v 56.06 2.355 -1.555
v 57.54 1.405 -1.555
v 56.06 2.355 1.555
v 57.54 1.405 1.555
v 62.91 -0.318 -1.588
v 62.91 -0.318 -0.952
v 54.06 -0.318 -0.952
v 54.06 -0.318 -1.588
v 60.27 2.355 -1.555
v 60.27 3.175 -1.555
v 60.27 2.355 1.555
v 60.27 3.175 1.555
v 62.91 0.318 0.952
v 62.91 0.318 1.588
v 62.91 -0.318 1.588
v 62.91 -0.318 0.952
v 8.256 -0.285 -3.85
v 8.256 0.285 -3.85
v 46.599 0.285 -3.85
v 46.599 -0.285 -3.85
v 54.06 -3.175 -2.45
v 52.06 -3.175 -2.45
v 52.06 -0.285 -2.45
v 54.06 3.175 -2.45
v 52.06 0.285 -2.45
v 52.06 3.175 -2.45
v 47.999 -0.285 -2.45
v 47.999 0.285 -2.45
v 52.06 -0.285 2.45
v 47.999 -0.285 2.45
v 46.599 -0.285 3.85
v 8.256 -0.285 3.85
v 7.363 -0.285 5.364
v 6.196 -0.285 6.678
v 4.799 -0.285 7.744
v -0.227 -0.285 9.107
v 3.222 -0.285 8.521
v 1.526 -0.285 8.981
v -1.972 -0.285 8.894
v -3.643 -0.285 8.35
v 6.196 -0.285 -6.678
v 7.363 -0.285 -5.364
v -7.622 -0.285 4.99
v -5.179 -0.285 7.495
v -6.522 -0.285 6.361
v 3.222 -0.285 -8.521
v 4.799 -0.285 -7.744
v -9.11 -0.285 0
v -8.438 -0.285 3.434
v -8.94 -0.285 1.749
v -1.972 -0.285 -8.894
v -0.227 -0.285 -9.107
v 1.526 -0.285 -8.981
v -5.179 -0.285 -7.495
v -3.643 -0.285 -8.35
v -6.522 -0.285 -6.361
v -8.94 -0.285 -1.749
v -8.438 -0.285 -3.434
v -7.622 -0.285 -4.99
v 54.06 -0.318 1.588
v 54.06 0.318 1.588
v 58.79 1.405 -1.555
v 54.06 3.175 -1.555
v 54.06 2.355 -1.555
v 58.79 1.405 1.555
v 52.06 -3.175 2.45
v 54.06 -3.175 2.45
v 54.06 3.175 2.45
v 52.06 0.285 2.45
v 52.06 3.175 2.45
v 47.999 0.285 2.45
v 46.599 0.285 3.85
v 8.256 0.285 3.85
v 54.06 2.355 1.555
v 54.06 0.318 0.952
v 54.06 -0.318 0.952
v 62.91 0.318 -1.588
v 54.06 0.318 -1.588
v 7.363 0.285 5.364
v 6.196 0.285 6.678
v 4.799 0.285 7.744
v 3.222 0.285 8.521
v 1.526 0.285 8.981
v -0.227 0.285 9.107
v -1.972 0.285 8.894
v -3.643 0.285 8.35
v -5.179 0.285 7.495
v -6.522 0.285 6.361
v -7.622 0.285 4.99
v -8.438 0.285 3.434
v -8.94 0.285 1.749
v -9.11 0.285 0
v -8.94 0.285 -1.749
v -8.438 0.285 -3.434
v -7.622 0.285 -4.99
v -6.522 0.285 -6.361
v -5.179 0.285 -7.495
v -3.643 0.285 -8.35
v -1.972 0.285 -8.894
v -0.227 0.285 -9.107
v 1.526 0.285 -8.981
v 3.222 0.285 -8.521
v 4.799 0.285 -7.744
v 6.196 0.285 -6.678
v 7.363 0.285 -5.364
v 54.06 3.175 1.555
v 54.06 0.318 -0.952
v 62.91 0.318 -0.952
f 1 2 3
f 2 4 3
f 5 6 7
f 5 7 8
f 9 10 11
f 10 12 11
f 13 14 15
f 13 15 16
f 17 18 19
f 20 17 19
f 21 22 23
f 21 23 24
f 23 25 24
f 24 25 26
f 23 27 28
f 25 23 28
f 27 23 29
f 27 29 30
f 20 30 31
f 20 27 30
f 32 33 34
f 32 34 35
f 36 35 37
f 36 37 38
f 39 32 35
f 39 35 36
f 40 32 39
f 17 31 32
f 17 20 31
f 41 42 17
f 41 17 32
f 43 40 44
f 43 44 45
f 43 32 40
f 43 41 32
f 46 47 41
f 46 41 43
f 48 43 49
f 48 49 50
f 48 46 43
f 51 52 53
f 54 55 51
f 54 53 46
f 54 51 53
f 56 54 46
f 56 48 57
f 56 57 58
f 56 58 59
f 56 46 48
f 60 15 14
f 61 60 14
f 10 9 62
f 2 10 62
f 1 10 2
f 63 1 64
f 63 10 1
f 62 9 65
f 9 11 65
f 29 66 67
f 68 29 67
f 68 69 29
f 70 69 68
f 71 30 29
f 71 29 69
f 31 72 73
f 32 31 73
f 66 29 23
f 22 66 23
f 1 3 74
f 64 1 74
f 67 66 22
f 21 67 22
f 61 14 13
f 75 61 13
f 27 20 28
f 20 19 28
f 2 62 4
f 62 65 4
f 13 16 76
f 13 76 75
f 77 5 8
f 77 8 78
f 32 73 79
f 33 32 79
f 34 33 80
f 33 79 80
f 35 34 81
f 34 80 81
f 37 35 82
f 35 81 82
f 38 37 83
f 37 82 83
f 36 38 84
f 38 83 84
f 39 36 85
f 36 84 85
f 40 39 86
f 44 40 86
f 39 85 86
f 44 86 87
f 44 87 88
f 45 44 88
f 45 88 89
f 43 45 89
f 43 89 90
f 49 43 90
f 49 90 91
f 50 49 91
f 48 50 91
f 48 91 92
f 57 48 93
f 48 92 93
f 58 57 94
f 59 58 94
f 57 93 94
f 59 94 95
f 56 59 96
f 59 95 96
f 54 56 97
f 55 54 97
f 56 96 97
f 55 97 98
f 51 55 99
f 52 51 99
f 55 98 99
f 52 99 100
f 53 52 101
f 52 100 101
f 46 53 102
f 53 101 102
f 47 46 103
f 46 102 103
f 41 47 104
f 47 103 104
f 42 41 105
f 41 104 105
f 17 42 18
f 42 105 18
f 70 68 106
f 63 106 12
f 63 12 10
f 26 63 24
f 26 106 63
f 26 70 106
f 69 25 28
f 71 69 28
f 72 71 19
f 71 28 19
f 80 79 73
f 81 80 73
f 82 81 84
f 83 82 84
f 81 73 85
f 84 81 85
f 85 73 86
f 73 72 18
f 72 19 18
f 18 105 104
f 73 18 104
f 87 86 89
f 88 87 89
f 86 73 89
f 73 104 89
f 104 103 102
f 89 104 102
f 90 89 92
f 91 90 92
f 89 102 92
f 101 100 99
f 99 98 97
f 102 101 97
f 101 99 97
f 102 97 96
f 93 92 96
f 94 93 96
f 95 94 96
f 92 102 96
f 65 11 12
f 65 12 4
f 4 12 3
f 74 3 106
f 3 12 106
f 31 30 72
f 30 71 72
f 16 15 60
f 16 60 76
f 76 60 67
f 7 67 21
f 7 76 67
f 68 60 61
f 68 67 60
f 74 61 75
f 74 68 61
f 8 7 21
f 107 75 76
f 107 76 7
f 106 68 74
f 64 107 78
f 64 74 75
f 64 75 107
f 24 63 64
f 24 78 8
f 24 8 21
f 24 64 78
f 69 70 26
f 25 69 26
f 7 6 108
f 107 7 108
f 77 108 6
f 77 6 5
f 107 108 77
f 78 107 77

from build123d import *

# Parameters (mm, degrees)
BOSS_EXTRUDE1_DEPTH = 0.285
SKETCH2_W           = 4.9
SKETCH2_H           = 6.35
BOSS_EXTRUDE2_DEPTH = 2
BOSS_EXTRUDE3_DEPTH = 1.555
SKETCH4_W           = 0.635
SKETCH4_H           = 0.635
BOSS_EXTRUDE4_DEPTH = 8.85


with BuildPart() as part:
    # Sketch1 → Boss-Extrude1 (new, symmetric)
    with BuildSketch(Plane(origin=(0, 0, 0), x_dir=(1, 0, 0), z_dir=(0, 1, 0))):
        with BuildLine():
            Line((8.256488358, 3.85), (46.598758561, 3.85))
            Line((46.598758561, 3.85), (47.998758561, 2.45))
            Line((47.998758561, 2.45), (52.06, 2.45))
            Line((52.06, 2.45), (52.06, -2.45))
            Line((52.06, -2.45), (47.998758561, -2.45))
            Line((47.998758561, -2.45), (46.598758561, -3.85))
            Line((46.598758561, -3.85), (8.256488358, -3.85))
            ThreePointArc((8.256488358, -3.85), (-9.11, 0), (8.256488358, 3.85))
        make_face()
    extrude(amount=BOSS_EXTRUDE1_DEPTH, both=True)

    # Sketch2 → Boss-Extrude2 (add)
    with BuildSketch(Plane(origin=(52.06, 0, 0), x_dir=(0, 0, -1), z_dir=(1, 0, 0))):
        Rectangle(SKETCH2_W, SKETCH2_H)
    extrude(amount=BOSS_EXTRUDE2_DEPTH)

    # Sketch3 → Boss-Extrude3 (add, symmetric)
    with BuildSketch(Plane.XY):
        Polygon((54.06, 3.175), (60.27, 3.175), (60.27, 2.355), (58.79, 1.405), (57.54, 1.405), (56.06, 2.355), (54.06, 2.355), align=None)
    extrude(amount=BOSS_EXTRUDE3_DEPTH, both=True)

    # Sketch4 → Boss-Extrude4 (add)
    with BuildSketch(Plane(origin=(54.06, 0, 0), x_dir=(0, 0, -1), z_dir=(1, 0, 0))):
        with Locations((-1.27, 0)):
            Rectangle(SKETCH4_W, SKETCH4_H)
        with Locations((1.27, 0)):
            Rectangle(SKETCH4_W, SKETCH4_H)
    extrude(amount=BOSS_EXTRUDE4_DEPTH)


solid = part.part
